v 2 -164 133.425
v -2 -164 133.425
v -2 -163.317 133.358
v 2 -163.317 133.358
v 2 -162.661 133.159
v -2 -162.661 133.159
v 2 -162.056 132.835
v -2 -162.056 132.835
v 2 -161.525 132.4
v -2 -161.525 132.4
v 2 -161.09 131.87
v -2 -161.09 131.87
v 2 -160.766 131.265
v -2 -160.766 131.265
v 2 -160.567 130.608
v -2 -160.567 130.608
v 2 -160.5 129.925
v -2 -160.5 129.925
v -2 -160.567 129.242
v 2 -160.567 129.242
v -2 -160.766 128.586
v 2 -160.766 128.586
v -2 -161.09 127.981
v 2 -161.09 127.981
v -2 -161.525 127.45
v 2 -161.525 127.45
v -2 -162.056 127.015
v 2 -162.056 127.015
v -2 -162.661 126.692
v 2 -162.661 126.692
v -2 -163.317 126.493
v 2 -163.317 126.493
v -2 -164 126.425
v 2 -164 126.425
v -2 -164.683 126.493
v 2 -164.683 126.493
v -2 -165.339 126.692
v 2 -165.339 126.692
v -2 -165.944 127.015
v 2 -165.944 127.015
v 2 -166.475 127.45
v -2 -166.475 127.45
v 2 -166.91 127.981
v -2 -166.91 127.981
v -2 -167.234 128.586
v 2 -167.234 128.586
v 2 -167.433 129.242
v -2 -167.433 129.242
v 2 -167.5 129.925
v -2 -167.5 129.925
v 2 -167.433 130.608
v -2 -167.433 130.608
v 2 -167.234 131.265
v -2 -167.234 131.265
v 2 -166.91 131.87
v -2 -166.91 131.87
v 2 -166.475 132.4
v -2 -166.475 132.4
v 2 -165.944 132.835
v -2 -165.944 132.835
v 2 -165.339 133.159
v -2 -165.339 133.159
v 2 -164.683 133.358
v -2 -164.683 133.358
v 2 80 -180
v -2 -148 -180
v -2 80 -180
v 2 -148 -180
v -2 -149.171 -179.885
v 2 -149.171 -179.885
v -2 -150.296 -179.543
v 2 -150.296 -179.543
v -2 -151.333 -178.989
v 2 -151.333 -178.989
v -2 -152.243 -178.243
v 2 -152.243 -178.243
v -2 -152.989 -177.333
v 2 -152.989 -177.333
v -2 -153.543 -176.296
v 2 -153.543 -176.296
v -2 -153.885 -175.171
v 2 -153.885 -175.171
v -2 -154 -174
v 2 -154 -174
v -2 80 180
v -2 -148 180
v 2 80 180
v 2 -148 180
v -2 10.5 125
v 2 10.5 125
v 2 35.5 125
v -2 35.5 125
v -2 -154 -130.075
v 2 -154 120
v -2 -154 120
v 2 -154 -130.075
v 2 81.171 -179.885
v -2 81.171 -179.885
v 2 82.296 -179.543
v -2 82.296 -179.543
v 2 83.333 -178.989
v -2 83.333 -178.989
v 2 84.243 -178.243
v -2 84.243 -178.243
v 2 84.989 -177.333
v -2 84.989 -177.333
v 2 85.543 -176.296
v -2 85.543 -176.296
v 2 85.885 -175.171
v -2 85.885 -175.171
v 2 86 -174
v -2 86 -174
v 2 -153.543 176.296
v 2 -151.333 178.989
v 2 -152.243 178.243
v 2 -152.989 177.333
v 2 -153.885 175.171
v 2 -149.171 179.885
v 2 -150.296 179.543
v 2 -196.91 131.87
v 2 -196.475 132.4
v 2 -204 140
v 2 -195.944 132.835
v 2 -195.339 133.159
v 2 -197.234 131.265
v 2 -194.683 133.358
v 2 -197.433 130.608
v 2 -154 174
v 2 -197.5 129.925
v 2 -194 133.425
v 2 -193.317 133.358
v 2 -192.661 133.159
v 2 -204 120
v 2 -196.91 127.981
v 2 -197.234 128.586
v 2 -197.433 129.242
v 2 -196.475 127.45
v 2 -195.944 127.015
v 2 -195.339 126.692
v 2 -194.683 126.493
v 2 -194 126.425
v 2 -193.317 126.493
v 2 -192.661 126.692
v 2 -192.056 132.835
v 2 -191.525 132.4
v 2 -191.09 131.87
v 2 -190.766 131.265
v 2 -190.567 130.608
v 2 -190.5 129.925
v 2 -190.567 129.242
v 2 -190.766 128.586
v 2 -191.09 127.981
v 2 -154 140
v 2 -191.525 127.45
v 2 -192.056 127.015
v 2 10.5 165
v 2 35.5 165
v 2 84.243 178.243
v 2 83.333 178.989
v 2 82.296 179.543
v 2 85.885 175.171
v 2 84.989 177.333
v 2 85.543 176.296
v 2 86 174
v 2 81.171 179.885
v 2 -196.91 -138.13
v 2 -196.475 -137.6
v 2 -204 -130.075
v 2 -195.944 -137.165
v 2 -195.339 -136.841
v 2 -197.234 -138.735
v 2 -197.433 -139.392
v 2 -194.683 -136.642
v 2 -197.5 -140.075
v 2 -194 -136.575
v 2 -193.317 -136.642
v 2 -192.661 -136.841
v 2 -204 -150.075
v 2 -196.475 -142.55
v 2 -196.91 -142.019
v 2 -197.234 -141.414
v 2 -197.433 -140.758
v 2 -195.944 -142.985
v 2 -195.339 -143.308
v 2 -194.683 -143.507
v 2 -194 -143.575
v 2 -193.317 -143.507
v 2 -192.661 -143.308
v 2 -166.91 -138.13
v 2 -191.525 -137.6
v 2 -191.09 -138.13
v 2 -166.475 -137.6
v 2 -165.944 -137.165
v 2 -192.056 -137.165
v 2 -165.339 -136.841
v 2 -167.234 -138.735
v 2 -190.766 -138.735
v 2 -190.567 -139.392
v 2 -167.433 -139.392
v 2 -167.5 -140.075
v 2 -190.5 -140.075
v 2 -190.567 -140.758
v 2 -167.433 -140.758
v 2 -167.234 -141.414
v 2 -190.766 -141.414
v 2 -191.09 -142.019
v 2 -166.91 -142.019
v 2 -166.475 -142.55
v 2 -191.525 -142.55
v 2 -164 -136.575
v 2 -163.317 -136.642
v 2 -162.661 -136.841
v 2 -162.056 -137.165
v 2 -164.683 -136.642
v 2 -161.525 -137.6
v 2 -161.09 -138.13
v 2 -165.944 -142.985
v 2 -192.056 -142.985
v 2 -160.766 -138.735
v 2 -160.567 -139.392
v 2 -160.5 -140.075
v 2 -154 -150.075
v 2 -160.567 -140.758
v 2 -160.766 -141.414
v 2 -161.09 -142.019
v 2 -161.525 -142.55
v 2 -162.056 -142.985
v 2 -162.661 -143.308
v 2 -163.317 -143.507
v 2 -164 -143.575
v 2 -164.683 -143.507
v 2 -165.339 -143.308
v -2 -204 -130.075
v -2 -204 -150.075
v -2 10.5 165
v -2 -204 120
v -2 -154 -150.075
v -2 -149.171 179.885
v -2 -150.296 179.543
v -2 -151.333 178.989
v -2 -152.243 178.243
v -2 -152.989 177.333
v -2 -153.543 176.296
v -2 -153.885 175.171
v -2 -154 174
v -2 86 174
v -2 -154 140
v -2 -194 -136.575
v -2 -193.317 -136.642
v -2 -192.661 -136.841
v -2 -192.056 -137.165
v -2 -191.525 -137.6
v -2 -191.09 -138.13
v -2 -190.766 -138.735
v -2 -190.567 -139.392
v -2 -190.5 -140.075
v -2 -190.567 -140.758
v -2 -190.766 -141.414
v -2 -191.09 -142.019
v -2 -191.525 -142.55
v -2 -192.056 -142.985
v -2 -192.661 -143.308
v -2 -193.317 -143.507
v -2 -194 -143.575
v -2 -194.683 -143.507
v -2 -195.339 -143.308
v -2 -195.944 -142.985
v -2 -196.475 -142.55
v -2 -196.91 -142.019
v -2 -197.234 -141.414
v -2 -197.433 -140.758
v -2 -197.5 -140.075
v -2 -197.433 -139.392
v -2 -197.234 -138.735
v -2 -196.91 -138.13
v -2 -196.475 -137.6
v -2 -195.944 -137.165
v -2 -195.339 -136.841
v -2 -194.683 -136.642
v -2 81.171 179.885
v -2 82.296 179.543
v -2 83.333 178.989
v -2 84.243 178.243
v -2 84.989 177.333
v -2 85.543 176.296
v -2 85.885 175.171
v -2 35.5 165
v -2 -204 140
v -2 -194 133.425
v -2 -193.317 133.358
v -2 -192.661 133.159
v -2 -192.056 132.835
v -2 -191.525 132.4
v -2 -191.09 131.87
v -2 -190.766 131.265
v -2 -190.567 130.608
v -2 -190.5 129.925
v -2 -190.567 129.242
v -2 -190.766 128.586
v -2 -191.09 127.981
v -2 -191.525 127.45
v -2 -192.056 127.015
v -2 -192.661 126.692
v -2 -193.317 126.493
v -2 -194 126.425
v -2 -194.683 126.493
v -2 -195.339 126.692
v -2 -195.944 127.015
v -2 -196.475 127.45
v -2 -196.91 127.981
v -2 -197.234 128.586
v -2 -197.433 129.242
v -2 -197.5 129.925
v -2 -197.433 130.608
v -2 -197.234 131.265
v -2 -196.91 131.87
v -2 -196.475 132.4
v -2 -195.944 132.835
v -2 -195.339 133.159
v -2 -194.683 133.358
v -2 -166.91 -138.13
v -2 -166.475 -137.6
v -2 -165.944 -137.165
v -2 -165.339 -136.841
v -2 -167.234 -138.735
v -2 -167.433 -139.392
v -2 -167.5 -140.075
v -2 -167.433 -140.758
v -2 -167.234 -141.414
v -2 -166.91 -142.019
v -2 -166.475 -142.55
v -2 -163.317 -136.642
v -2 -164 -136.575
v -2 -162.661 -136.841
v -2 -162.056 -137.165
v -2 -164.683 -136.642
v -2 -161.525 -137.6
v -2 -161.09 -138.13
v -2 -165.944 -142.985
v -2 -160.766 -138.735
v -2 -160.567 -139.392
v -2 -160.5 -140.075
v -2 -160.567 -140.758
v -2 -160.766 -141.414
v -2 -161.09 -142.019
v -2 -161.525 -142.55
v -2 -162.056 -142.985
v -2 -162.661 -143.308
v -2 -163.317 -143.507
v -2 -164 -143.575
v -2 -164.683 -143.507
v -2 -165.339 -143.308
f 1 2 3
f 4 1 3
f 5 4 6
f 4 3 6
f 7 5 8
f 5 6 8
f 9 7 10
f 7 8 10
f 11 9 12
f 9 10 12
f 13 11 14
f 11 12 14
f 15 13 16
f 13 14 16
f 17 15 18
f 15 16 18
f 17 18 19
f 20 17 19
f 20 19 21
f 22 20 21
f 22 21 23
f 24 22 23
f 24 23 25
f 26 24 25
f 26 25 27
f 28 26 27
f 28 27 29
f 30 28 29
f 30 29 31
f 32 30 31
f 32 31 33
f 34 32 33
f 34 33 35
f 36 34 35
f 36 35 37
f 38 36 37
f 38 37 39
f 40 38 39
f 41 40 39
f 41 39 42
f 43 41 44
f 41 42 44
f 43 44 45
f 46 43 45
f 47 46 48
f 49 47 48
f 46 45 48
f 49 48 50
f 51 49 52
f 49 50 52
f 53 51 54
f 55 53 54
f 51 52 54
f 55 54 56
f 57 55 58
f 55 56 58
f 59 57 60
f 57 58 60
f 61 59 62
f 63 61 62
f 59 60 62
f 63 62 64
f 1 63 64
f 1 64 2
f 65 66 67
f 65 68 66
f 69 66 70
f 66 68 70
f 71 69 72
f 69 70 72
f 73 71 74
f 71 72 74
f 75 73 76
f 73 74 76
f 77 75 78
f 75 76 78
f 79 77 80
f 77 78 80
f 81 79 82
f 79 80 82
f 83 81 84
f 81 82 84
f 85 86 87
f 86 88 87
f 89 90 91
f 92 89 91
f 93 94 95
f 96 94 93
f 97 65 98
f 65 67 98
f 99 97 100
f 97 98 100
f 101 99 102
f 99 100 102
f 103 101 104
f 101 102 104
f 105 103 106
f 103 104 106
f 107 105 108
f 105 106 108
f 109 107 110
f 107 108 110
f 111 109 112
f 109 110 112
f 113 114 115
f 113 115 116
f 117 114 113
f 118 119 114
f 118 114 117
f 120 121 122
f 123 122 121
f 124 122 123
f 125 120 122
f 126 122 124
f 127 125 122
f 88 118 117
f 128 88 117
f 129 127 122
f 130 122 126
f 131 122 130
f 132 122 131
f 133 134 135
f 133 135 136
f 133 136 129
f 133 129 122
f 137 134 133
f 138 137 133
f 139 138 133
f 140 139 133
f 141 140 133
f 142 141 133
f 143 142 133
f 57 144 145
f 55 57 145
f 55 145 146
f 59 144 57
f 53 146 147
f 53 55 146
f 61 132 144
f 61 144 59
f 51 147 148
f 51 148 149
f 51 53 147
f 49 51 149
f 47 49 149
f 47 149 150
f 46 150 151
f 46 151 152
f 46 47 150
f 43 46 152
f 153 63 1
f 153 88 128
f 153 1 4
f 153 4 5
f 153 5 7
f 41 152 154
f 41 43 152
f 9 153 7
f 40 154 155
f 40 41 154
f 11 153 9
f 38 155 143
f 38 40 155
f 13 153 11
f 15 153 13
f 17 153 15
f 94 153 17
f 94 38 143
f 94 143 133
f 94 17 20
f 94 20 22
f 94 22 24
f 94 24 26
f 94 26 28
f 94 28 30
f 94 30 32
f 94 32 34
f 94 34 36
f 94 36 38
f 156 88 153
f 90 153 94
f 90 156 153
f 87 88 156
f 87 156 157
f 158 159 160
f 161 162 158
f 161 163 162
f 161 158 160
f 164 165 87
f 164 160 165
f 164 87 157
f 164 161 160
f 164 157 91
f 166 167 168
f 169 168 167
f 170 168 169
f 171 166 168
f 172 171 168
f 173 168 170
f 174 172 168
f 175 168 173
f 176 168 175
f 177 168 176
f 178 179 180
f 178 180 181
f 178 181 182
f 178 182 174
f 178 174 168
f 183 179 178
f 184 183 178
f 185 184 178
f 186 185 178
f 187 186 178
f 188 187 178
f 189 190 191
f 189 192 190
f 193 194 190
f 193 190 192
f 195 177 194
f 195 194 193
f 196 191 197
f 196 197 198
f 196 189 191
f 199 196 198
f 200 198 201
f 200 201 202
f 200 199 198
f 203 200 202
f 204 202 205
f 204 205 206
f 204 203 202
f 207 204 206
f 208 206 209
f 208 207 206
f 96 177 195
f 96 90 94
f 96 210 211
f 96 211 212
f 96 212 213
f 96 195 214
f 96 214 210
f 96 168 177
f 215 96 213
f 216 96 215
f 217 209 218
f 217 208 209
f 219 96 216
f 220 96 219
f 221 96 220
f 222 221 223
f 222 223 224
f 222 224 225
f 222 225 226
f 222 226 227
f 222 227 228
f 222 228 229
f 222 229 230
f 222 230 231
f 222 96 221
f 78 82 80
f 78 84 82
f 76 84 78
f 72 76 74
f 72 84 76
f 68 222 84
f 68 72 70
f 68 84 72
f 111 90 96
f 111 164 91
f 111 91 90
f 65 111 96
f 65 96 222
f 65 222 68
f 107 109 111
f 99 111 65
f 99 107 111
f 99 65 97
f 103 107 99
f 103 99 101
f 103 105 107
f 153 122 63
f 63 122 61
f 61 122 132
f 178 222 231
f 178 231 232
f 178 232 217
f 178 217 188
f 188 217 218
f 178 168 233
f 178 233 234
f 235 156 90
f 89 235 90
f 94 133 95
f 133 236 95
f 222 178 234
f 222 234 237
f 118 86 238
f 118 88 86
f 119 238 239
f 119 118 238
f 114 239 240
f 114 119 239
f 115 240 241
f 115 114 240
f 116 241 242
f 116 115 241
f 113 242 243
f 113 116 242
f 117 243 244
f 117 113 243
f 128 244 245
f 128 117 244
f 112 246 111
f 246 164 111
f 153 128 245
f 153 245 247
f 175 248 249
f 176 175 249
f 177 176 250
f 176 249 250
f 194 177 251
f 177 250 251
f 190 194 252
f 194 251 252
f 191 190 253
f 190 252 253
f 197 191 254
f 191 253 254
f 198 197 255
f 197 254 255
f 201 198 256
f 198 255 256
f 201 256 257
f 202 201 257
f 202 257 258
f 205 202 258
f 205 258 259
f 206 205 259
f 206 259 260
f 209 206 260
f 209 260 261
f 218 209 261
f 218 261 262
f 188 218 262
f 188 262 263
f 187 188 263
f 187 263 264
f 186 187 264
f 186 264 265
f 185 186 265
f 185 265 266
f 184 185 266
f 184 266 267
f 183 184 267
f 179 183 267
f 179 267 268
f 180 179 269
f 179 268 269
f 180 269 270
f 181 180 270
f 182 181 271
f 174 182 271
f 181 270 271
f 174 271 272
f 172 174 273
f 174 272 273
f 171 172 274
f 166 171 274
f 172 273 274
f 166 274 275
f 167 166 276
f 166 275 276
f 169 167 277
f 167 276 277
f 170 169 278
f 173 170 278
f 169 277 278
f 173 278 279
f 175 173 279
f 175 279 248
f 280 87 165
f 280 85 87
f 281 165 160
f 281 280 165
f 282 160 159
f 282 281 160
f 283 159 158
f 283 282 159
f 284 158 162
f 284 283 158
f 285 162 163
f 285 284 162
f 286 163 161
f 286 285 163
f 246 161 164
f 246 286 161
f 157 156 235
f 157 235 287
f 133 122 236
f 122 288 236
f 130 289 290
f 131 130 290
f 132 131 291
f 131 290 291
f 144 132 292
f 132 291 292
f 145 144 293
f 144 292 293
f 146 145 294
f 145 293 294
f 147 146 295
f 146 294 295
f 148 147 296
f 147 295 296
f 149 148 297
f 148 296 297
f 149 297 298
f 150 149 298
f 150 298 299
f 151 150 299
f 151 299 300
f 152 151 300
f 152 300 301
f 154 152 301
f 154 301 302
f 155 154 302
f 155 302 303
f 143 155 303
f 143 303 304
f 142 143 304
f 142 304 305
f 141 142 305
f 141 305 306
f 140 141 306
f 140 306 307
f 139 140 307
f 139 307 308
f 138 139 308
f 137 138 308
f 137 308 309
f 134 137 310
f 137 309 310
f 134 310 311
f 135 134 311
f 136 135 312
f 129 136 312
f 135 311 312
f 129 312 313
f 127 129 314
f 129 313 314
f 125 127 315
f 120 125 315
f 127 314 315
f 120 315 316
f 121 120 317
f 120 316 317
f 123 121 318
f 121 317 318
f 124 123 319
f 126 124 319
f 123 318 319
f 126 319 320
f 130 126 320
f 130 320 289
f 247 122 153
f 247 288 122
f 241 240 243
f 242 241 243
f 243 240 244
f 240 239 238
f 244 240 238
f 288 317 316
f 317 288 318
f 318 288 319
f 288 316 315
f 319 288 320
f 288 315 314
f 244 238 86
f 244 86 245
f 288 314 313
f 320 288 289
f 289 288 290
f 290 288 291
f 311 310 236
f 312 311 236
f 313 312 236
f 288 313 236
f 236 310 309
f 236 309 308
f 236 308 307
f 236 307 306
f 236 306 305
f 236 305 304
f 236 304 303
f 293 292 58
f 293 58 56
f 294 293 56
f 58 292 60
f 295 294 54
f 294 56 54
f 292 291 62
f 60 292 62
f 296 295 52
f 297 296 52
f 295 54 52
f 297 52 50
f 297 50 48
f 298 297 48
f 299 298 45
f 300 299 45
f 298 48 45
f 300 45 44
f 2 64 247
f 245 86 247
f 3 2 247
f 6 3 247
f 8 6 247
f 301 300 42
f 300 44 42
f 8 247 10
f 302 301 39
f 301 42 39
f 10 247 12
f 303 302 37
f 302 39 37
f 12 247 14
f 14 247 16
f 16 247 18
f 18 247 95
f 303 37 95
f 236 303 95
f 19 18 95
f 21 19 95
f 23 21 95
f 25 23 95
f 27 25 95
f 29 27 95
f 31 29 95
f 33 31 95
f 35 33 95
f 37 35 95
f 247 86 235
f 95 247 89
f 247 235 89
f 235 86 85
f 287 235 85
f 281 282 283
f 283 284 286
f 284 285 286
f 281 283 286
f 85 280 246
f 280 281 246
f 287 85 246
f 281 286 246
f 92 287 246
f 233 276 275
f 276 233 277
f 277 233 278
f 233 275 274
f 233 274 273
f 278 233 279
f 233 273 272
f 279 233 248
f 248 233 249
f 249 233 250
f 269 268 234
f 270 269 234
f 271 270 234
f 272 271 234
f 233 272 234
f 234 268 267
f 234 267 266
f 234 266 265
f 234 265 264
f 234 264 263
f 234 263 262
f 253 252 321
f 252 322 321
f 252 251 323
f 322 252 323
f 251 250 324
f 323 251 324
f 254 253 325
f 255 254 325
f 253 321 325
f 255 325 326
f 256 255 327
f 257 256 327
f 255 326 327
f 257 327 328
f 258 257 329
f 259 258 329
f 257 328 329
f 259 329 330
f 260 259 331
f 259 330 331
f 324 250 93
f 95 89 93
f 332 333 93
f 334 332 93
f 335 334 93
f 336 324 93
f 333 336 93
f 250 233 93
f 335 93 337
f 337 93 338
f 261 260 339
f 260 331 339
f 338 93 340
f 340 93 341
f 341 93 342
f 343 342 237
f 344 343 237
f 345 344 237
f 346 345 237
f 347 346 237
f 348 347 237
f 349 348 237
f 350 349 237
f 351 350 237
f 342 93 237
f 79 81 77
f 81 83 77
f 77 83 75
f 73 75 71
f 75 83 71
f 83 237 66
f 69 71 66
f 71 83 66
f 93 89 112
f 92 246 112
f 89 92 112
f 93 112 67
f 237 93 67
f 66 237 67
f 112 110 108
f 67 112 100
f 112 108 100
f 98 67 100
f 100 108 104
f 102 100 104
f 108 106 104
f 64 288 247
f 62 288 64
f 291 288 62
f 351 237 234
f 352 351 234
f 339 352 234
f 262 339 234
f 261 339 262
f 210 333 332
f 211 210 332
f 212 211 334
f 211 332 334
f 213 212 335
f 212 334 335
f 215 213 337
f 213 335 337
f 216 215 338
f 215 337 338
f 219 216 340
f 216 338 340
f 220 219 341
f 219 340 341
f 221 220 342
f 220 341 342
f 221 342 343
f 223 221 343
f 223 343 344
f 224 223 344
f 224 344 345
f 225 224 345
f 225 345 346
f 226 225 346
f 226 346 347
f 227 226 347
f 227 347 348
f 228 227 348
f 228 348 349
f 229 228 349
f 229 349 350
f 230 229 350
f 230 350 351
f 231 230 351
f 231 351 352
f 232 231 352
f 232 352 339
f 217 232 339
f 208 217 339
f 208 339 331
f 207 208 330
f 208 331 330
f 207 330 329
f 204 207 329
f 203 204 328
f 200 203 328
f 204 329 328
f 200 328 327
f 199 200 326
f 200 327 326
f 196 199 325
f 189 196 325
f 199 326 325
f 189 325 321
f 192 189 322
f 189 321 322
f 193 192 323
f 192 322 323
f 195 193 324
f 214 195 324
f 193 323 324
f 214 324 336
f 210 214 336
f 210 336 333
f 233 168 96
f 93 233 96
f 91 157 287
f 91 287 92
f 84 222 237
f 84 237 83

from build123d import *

# Parameters (mm, degrees)
SKETCH2_W             = 360
SKETCH2_H             = 240
BOSS_EXTRUDE2_DEPTH   = 2
FILLET1_R             = 6
SKETCH3_W             = 40
SKETCH3_H             = 25
CUT_EXTRUDE1_DEPTH    = 237.921928069
SKETCH4_W             = 20
SKETCH4_H             = 50
BOSS_EXTRUDE3_DEPTH   = 2
M8X1_0_TAPPED_HOLE1_D = 7


with BuildPart() as part:
    # Sketch2 → Boss-Extrude2 (new, symmetric)
    with BuildSketch(Plane(origin=(0, 0, 0), x_dir=(0, 0, -1), z_dir=(1, 0, 0))):
        with Locations((0, -34)):
            Rectangle(SKETCH2_W, SKETCH2_H)
    extrude(amount=BOSS_EXTRUDE2_DEPTH, both=True)

    # Fillet1
    fillet1_edges = [part.edges().sort_by_distance(p)[0] for p in [
        (0, -154, -180),
        (0, -154, 180),
        (0, 86, 180),
        (0, 86, -180),
    ]]
    fillet(fillet1_edges, radius=FILLET1_R)

    # Sketch3 → Cut-Extrude1 (cut, through all)
    with BuildSketch(Plane(origin=(2, 0, 0), x_dir=(0, 0, -1), z_dir=(1, 0, 0))):
        with Locations((-145, 23)):
            Rectangle(SKETCH3_W, SKETCH3_H)
    extrude(amount=-CUT_EXTRUDE1_DEPTH, mode=Mode.SUBTRACT)

    # Sketch4 → Boss-Extrude3 (add, symmetric)
    with BuildSketch(Plane(origin=(0, 0, 0), x_dir=(0, 0, -1), z_dir=(1, 0, 0))):
        with Locations((-130, -179)):
            Rectangle(SKETCH4_W, SKETCH4_H)
        with Locations((140.074687189, -179)):
            Rectangle(SKETCH4_W, SKETCH4_H)
    extrude(amount=BOSS_EXTRUDE3_DEPTH, both=True)

    # M8x1.0 Tapped Hole1 (through all)
    with Locations(Plane(origin=(2, 0, 0), x_dir=(0, 0, -1), z_dir=(1, 0, 0))):
        with Locations((-129.925312811, -194), (-129.925312811, -164), (140.074687189, -194), (140.074687189, -164)):
            Hole(M8X1_0_TAPPED_HOLE1_D / 2)


solid = part.part
